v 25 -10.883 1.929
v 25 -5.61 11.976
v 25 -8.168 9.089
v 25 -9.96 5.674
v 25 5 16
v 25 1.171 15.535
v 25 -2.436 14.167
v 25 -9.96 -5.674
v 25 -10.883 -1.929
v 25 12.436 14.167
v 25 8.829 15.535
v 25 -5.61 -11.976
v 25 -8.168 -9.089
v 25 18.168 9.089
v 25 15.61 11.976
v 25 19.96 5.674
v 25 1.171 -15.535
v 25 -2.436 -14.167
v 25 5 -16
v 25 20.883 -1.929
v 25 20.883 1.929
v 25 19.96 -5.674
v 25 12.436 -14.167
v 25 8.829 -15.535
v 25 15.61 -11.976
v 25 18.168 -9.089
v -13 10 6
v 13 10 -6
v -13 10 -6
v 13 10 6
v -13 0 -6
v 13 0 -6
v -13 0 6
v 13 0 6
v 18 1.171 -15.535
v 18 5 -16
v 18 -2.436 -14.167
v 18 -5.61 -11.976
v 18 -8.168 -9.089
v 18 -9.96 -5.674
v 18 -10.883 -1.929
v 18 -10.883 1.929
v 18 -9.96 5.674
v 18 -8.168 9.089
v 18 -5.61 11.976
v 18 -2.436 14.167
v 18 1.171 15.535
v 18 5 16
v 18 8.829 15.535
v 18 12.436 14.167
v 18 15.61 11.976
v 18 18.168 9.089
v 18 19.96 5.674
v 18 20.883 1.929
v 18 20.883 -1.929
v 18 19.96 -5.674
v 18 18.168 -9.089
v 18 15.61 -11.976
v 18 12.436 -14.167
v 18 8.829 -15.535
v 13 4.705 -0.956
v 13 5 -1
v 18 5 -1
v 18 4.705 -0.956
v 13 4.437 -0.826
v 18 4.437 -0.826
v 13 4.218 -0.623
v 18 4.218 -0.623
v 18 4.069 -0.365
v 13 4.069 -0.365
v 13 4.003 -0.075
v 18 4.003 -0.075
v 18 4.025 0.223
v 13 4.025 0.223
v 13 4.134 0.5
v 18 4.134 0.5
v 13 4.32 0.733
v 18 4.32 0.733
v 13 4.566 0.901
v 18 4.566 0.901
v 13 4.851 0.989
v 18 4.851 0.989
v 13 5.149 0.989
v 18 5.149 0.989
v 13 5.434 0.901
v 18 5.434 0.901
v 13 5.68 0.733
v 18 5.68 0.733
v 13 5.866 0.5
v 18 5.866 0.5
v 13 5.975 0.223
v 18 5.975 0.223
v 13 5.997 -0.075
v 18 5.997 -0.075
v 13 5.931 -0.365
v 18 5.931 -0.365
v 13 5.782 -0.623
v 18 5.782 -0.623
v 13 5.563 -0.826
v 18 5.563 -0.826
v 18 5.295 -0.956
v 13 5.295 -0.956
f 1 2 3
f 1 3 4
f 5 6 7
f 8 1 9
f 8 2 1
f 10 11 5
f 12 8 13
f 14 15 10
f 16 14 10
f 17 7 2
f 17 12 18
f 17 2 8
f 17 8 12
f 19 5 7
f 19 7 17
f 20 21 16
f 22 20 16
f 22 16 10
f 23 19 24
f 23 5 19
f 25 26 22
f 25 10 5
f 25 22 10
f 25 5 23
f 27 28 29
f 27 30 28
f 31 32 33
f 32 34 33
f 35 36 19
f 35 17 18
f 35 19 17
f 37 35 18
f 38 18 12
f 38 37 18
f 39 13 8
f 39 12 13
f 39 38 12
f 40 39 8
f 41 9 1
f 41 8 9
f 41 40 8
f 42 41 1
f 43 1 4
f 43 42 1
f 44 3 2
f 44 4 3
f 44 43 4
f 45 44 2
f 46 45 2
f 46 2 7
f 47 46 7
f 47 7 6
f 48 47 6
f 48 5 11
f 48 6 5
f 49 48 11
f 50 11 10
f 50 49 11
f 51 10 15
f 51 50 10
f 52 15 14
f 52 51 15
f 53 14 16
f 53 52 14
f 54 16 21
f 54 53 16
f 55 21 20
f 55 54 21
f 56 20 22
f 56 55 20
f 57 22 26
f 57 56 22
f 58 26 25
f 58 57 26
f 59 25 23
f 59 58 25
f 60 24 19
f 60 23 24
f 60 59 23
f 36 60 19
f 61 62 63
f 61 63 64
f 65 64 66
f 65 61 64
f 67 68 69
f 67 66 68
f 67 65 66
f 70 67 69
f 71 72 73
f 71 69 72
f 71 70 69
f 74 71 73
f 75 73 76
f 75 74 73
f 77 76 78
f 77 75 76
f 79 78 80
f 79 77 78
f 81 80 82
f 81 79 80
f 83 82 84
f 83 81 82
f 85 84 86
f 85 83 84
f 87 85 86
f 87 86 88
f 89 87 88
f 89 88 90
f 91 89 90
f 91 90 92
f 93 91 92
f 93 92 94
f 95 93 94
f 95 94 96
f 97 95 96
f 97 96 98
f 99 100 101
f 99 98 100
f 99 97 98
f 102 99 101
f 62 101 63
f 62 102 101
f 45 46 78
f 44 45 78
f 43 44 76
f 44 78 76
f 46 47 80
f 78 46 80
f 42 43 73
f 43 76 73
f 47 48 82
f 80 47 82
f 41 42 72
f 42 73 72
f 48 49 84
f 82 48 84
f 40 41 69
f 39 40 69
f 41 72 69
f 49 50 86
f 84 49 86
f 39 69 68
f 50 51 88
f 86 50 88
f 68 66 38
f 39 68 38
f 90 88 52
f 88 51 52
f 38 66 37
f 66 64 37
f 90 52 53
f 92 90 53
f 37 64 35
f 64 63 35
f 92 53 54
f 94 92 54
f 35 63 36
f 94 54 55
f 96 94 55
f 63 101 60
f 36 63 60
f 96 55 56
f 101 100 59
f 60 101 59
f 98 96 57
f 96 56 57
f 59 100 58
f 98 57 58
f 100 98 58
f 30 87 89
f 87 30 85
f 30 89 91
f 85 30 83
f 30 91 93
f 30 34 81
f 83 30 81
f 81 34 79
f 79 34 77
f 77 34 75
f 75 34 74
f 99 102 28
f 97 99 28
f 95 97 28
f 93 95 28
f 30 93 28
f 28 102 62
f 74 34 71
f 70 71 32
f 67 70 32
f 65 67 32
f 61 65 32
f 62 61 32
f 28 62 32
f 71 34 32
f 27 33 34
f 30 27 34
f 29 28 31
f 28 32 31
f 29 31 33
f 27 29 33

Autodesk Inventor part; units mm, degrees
ref_plane "YZ Plane" through (0, 0, 0) normal (1, 0, 0) x (0, 1, 0)
ref_plane "XZ Plane" through (0, 0, 0) normal (0, 1, 0) x (-1, 0, 0)
ref_plane "XY Plane" through (0, 0, 0) normal (0, 0, 1) x (1, 0, 0)
sketch "Sketch1" plane through (0, 0, 0) normal (0, 1, 0) x (-1, 0, 0)
  line L0 (13, 6) -> (-13, 6)
  line L1 (-13, 6) -> (-13, -6)
  line L2 (-13, -6) -> (13, -6)
  line L3 (13, -6) -> (13, 6)
  point P0 (0, 0)
  dimension "d0" = 6
  dimension "d1" = 6
  dimension "d2" = 26
  dimension "d3" = 13
extrude "Extrusion1" add sketch "Sketch1" along normal blind 10
sketch "Sketch2" plane through (13, 0, 6) normal (1, 0, 0) x (0, 0, -1)
  line L0 (0, 10) -> (0, 0)
  circle A0 centre (6, 5) radius 1
  point P0 (6, 0)
  dimension "d6" = 2
extrude "Extrusion2" add sketch "Sketch2" along normal blind 5
sketch "Sketch3" plane through (18, 5, 0) normal (1, 0, 0) x (0, 0, -1)
  circle A0 centre (0, 0) radius 16
  point P0 (0, -5)
  dimension "d9" = 32
extrude "Extrusion3" add sketch "Sketch3" along normal blind 7
properties part number "Motor"
